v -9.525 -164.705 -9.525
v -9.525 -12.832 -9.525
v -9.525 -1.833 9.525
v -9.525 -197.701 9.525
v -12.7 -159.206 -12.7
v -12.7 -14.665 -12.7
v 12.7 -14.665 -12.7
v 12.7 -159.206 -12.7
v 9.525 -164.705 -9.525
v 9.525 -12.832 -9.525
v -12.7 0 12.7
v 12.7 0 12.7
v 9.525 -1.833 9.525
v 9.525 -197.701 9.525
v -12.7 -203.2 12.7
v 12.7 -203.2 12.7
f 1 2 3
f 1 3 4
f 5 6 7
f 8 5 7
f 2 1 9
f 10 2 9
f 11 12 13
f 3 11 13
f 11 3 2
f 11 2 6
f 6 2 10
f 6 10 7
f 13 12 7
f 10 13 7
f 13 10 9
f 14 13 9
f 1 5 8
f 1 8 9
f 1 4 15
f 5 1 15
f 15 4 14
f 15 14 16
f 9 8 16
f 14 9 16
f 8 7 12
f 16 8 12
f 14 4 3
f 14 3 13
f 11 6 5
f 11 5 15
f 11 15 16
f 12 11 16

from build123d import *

# Parameters (mm, degrees)
F0_W     = 25.4
F0_H     = 25.4
F0_W_2   = 19.05
F0_H_2   = 19.05
F1_DEPTH = 203.2
F3_DEPTH = 25.401


with BuildPart() as f1:
    # F0 (on Front) → F1 (new body)
    with BuildSketch(Plane.XZ):
        Rectangle(F0_W, F0_H)
        Rectangle(F0_W_2, F0_H_2, mode=Mode.SUBTRACT)
    extrude(amount=F1_DEPTH)

    # F2 (on face) → F3 (cut, through all)
    with BuildSketch(Plane.YZ.offset(12.7)):
        Polygon((-159.205909, -12.7), (-203.2, 12.7), (-203.2, -12.7), align=None)
        Polygon((0, -12.7), (0, 12.7), (-14.664697, -12.7), align=None)
    extrude(amount=-F3_DEPTH, mode=Mode.SUBTRACT)


solid = f1.part
